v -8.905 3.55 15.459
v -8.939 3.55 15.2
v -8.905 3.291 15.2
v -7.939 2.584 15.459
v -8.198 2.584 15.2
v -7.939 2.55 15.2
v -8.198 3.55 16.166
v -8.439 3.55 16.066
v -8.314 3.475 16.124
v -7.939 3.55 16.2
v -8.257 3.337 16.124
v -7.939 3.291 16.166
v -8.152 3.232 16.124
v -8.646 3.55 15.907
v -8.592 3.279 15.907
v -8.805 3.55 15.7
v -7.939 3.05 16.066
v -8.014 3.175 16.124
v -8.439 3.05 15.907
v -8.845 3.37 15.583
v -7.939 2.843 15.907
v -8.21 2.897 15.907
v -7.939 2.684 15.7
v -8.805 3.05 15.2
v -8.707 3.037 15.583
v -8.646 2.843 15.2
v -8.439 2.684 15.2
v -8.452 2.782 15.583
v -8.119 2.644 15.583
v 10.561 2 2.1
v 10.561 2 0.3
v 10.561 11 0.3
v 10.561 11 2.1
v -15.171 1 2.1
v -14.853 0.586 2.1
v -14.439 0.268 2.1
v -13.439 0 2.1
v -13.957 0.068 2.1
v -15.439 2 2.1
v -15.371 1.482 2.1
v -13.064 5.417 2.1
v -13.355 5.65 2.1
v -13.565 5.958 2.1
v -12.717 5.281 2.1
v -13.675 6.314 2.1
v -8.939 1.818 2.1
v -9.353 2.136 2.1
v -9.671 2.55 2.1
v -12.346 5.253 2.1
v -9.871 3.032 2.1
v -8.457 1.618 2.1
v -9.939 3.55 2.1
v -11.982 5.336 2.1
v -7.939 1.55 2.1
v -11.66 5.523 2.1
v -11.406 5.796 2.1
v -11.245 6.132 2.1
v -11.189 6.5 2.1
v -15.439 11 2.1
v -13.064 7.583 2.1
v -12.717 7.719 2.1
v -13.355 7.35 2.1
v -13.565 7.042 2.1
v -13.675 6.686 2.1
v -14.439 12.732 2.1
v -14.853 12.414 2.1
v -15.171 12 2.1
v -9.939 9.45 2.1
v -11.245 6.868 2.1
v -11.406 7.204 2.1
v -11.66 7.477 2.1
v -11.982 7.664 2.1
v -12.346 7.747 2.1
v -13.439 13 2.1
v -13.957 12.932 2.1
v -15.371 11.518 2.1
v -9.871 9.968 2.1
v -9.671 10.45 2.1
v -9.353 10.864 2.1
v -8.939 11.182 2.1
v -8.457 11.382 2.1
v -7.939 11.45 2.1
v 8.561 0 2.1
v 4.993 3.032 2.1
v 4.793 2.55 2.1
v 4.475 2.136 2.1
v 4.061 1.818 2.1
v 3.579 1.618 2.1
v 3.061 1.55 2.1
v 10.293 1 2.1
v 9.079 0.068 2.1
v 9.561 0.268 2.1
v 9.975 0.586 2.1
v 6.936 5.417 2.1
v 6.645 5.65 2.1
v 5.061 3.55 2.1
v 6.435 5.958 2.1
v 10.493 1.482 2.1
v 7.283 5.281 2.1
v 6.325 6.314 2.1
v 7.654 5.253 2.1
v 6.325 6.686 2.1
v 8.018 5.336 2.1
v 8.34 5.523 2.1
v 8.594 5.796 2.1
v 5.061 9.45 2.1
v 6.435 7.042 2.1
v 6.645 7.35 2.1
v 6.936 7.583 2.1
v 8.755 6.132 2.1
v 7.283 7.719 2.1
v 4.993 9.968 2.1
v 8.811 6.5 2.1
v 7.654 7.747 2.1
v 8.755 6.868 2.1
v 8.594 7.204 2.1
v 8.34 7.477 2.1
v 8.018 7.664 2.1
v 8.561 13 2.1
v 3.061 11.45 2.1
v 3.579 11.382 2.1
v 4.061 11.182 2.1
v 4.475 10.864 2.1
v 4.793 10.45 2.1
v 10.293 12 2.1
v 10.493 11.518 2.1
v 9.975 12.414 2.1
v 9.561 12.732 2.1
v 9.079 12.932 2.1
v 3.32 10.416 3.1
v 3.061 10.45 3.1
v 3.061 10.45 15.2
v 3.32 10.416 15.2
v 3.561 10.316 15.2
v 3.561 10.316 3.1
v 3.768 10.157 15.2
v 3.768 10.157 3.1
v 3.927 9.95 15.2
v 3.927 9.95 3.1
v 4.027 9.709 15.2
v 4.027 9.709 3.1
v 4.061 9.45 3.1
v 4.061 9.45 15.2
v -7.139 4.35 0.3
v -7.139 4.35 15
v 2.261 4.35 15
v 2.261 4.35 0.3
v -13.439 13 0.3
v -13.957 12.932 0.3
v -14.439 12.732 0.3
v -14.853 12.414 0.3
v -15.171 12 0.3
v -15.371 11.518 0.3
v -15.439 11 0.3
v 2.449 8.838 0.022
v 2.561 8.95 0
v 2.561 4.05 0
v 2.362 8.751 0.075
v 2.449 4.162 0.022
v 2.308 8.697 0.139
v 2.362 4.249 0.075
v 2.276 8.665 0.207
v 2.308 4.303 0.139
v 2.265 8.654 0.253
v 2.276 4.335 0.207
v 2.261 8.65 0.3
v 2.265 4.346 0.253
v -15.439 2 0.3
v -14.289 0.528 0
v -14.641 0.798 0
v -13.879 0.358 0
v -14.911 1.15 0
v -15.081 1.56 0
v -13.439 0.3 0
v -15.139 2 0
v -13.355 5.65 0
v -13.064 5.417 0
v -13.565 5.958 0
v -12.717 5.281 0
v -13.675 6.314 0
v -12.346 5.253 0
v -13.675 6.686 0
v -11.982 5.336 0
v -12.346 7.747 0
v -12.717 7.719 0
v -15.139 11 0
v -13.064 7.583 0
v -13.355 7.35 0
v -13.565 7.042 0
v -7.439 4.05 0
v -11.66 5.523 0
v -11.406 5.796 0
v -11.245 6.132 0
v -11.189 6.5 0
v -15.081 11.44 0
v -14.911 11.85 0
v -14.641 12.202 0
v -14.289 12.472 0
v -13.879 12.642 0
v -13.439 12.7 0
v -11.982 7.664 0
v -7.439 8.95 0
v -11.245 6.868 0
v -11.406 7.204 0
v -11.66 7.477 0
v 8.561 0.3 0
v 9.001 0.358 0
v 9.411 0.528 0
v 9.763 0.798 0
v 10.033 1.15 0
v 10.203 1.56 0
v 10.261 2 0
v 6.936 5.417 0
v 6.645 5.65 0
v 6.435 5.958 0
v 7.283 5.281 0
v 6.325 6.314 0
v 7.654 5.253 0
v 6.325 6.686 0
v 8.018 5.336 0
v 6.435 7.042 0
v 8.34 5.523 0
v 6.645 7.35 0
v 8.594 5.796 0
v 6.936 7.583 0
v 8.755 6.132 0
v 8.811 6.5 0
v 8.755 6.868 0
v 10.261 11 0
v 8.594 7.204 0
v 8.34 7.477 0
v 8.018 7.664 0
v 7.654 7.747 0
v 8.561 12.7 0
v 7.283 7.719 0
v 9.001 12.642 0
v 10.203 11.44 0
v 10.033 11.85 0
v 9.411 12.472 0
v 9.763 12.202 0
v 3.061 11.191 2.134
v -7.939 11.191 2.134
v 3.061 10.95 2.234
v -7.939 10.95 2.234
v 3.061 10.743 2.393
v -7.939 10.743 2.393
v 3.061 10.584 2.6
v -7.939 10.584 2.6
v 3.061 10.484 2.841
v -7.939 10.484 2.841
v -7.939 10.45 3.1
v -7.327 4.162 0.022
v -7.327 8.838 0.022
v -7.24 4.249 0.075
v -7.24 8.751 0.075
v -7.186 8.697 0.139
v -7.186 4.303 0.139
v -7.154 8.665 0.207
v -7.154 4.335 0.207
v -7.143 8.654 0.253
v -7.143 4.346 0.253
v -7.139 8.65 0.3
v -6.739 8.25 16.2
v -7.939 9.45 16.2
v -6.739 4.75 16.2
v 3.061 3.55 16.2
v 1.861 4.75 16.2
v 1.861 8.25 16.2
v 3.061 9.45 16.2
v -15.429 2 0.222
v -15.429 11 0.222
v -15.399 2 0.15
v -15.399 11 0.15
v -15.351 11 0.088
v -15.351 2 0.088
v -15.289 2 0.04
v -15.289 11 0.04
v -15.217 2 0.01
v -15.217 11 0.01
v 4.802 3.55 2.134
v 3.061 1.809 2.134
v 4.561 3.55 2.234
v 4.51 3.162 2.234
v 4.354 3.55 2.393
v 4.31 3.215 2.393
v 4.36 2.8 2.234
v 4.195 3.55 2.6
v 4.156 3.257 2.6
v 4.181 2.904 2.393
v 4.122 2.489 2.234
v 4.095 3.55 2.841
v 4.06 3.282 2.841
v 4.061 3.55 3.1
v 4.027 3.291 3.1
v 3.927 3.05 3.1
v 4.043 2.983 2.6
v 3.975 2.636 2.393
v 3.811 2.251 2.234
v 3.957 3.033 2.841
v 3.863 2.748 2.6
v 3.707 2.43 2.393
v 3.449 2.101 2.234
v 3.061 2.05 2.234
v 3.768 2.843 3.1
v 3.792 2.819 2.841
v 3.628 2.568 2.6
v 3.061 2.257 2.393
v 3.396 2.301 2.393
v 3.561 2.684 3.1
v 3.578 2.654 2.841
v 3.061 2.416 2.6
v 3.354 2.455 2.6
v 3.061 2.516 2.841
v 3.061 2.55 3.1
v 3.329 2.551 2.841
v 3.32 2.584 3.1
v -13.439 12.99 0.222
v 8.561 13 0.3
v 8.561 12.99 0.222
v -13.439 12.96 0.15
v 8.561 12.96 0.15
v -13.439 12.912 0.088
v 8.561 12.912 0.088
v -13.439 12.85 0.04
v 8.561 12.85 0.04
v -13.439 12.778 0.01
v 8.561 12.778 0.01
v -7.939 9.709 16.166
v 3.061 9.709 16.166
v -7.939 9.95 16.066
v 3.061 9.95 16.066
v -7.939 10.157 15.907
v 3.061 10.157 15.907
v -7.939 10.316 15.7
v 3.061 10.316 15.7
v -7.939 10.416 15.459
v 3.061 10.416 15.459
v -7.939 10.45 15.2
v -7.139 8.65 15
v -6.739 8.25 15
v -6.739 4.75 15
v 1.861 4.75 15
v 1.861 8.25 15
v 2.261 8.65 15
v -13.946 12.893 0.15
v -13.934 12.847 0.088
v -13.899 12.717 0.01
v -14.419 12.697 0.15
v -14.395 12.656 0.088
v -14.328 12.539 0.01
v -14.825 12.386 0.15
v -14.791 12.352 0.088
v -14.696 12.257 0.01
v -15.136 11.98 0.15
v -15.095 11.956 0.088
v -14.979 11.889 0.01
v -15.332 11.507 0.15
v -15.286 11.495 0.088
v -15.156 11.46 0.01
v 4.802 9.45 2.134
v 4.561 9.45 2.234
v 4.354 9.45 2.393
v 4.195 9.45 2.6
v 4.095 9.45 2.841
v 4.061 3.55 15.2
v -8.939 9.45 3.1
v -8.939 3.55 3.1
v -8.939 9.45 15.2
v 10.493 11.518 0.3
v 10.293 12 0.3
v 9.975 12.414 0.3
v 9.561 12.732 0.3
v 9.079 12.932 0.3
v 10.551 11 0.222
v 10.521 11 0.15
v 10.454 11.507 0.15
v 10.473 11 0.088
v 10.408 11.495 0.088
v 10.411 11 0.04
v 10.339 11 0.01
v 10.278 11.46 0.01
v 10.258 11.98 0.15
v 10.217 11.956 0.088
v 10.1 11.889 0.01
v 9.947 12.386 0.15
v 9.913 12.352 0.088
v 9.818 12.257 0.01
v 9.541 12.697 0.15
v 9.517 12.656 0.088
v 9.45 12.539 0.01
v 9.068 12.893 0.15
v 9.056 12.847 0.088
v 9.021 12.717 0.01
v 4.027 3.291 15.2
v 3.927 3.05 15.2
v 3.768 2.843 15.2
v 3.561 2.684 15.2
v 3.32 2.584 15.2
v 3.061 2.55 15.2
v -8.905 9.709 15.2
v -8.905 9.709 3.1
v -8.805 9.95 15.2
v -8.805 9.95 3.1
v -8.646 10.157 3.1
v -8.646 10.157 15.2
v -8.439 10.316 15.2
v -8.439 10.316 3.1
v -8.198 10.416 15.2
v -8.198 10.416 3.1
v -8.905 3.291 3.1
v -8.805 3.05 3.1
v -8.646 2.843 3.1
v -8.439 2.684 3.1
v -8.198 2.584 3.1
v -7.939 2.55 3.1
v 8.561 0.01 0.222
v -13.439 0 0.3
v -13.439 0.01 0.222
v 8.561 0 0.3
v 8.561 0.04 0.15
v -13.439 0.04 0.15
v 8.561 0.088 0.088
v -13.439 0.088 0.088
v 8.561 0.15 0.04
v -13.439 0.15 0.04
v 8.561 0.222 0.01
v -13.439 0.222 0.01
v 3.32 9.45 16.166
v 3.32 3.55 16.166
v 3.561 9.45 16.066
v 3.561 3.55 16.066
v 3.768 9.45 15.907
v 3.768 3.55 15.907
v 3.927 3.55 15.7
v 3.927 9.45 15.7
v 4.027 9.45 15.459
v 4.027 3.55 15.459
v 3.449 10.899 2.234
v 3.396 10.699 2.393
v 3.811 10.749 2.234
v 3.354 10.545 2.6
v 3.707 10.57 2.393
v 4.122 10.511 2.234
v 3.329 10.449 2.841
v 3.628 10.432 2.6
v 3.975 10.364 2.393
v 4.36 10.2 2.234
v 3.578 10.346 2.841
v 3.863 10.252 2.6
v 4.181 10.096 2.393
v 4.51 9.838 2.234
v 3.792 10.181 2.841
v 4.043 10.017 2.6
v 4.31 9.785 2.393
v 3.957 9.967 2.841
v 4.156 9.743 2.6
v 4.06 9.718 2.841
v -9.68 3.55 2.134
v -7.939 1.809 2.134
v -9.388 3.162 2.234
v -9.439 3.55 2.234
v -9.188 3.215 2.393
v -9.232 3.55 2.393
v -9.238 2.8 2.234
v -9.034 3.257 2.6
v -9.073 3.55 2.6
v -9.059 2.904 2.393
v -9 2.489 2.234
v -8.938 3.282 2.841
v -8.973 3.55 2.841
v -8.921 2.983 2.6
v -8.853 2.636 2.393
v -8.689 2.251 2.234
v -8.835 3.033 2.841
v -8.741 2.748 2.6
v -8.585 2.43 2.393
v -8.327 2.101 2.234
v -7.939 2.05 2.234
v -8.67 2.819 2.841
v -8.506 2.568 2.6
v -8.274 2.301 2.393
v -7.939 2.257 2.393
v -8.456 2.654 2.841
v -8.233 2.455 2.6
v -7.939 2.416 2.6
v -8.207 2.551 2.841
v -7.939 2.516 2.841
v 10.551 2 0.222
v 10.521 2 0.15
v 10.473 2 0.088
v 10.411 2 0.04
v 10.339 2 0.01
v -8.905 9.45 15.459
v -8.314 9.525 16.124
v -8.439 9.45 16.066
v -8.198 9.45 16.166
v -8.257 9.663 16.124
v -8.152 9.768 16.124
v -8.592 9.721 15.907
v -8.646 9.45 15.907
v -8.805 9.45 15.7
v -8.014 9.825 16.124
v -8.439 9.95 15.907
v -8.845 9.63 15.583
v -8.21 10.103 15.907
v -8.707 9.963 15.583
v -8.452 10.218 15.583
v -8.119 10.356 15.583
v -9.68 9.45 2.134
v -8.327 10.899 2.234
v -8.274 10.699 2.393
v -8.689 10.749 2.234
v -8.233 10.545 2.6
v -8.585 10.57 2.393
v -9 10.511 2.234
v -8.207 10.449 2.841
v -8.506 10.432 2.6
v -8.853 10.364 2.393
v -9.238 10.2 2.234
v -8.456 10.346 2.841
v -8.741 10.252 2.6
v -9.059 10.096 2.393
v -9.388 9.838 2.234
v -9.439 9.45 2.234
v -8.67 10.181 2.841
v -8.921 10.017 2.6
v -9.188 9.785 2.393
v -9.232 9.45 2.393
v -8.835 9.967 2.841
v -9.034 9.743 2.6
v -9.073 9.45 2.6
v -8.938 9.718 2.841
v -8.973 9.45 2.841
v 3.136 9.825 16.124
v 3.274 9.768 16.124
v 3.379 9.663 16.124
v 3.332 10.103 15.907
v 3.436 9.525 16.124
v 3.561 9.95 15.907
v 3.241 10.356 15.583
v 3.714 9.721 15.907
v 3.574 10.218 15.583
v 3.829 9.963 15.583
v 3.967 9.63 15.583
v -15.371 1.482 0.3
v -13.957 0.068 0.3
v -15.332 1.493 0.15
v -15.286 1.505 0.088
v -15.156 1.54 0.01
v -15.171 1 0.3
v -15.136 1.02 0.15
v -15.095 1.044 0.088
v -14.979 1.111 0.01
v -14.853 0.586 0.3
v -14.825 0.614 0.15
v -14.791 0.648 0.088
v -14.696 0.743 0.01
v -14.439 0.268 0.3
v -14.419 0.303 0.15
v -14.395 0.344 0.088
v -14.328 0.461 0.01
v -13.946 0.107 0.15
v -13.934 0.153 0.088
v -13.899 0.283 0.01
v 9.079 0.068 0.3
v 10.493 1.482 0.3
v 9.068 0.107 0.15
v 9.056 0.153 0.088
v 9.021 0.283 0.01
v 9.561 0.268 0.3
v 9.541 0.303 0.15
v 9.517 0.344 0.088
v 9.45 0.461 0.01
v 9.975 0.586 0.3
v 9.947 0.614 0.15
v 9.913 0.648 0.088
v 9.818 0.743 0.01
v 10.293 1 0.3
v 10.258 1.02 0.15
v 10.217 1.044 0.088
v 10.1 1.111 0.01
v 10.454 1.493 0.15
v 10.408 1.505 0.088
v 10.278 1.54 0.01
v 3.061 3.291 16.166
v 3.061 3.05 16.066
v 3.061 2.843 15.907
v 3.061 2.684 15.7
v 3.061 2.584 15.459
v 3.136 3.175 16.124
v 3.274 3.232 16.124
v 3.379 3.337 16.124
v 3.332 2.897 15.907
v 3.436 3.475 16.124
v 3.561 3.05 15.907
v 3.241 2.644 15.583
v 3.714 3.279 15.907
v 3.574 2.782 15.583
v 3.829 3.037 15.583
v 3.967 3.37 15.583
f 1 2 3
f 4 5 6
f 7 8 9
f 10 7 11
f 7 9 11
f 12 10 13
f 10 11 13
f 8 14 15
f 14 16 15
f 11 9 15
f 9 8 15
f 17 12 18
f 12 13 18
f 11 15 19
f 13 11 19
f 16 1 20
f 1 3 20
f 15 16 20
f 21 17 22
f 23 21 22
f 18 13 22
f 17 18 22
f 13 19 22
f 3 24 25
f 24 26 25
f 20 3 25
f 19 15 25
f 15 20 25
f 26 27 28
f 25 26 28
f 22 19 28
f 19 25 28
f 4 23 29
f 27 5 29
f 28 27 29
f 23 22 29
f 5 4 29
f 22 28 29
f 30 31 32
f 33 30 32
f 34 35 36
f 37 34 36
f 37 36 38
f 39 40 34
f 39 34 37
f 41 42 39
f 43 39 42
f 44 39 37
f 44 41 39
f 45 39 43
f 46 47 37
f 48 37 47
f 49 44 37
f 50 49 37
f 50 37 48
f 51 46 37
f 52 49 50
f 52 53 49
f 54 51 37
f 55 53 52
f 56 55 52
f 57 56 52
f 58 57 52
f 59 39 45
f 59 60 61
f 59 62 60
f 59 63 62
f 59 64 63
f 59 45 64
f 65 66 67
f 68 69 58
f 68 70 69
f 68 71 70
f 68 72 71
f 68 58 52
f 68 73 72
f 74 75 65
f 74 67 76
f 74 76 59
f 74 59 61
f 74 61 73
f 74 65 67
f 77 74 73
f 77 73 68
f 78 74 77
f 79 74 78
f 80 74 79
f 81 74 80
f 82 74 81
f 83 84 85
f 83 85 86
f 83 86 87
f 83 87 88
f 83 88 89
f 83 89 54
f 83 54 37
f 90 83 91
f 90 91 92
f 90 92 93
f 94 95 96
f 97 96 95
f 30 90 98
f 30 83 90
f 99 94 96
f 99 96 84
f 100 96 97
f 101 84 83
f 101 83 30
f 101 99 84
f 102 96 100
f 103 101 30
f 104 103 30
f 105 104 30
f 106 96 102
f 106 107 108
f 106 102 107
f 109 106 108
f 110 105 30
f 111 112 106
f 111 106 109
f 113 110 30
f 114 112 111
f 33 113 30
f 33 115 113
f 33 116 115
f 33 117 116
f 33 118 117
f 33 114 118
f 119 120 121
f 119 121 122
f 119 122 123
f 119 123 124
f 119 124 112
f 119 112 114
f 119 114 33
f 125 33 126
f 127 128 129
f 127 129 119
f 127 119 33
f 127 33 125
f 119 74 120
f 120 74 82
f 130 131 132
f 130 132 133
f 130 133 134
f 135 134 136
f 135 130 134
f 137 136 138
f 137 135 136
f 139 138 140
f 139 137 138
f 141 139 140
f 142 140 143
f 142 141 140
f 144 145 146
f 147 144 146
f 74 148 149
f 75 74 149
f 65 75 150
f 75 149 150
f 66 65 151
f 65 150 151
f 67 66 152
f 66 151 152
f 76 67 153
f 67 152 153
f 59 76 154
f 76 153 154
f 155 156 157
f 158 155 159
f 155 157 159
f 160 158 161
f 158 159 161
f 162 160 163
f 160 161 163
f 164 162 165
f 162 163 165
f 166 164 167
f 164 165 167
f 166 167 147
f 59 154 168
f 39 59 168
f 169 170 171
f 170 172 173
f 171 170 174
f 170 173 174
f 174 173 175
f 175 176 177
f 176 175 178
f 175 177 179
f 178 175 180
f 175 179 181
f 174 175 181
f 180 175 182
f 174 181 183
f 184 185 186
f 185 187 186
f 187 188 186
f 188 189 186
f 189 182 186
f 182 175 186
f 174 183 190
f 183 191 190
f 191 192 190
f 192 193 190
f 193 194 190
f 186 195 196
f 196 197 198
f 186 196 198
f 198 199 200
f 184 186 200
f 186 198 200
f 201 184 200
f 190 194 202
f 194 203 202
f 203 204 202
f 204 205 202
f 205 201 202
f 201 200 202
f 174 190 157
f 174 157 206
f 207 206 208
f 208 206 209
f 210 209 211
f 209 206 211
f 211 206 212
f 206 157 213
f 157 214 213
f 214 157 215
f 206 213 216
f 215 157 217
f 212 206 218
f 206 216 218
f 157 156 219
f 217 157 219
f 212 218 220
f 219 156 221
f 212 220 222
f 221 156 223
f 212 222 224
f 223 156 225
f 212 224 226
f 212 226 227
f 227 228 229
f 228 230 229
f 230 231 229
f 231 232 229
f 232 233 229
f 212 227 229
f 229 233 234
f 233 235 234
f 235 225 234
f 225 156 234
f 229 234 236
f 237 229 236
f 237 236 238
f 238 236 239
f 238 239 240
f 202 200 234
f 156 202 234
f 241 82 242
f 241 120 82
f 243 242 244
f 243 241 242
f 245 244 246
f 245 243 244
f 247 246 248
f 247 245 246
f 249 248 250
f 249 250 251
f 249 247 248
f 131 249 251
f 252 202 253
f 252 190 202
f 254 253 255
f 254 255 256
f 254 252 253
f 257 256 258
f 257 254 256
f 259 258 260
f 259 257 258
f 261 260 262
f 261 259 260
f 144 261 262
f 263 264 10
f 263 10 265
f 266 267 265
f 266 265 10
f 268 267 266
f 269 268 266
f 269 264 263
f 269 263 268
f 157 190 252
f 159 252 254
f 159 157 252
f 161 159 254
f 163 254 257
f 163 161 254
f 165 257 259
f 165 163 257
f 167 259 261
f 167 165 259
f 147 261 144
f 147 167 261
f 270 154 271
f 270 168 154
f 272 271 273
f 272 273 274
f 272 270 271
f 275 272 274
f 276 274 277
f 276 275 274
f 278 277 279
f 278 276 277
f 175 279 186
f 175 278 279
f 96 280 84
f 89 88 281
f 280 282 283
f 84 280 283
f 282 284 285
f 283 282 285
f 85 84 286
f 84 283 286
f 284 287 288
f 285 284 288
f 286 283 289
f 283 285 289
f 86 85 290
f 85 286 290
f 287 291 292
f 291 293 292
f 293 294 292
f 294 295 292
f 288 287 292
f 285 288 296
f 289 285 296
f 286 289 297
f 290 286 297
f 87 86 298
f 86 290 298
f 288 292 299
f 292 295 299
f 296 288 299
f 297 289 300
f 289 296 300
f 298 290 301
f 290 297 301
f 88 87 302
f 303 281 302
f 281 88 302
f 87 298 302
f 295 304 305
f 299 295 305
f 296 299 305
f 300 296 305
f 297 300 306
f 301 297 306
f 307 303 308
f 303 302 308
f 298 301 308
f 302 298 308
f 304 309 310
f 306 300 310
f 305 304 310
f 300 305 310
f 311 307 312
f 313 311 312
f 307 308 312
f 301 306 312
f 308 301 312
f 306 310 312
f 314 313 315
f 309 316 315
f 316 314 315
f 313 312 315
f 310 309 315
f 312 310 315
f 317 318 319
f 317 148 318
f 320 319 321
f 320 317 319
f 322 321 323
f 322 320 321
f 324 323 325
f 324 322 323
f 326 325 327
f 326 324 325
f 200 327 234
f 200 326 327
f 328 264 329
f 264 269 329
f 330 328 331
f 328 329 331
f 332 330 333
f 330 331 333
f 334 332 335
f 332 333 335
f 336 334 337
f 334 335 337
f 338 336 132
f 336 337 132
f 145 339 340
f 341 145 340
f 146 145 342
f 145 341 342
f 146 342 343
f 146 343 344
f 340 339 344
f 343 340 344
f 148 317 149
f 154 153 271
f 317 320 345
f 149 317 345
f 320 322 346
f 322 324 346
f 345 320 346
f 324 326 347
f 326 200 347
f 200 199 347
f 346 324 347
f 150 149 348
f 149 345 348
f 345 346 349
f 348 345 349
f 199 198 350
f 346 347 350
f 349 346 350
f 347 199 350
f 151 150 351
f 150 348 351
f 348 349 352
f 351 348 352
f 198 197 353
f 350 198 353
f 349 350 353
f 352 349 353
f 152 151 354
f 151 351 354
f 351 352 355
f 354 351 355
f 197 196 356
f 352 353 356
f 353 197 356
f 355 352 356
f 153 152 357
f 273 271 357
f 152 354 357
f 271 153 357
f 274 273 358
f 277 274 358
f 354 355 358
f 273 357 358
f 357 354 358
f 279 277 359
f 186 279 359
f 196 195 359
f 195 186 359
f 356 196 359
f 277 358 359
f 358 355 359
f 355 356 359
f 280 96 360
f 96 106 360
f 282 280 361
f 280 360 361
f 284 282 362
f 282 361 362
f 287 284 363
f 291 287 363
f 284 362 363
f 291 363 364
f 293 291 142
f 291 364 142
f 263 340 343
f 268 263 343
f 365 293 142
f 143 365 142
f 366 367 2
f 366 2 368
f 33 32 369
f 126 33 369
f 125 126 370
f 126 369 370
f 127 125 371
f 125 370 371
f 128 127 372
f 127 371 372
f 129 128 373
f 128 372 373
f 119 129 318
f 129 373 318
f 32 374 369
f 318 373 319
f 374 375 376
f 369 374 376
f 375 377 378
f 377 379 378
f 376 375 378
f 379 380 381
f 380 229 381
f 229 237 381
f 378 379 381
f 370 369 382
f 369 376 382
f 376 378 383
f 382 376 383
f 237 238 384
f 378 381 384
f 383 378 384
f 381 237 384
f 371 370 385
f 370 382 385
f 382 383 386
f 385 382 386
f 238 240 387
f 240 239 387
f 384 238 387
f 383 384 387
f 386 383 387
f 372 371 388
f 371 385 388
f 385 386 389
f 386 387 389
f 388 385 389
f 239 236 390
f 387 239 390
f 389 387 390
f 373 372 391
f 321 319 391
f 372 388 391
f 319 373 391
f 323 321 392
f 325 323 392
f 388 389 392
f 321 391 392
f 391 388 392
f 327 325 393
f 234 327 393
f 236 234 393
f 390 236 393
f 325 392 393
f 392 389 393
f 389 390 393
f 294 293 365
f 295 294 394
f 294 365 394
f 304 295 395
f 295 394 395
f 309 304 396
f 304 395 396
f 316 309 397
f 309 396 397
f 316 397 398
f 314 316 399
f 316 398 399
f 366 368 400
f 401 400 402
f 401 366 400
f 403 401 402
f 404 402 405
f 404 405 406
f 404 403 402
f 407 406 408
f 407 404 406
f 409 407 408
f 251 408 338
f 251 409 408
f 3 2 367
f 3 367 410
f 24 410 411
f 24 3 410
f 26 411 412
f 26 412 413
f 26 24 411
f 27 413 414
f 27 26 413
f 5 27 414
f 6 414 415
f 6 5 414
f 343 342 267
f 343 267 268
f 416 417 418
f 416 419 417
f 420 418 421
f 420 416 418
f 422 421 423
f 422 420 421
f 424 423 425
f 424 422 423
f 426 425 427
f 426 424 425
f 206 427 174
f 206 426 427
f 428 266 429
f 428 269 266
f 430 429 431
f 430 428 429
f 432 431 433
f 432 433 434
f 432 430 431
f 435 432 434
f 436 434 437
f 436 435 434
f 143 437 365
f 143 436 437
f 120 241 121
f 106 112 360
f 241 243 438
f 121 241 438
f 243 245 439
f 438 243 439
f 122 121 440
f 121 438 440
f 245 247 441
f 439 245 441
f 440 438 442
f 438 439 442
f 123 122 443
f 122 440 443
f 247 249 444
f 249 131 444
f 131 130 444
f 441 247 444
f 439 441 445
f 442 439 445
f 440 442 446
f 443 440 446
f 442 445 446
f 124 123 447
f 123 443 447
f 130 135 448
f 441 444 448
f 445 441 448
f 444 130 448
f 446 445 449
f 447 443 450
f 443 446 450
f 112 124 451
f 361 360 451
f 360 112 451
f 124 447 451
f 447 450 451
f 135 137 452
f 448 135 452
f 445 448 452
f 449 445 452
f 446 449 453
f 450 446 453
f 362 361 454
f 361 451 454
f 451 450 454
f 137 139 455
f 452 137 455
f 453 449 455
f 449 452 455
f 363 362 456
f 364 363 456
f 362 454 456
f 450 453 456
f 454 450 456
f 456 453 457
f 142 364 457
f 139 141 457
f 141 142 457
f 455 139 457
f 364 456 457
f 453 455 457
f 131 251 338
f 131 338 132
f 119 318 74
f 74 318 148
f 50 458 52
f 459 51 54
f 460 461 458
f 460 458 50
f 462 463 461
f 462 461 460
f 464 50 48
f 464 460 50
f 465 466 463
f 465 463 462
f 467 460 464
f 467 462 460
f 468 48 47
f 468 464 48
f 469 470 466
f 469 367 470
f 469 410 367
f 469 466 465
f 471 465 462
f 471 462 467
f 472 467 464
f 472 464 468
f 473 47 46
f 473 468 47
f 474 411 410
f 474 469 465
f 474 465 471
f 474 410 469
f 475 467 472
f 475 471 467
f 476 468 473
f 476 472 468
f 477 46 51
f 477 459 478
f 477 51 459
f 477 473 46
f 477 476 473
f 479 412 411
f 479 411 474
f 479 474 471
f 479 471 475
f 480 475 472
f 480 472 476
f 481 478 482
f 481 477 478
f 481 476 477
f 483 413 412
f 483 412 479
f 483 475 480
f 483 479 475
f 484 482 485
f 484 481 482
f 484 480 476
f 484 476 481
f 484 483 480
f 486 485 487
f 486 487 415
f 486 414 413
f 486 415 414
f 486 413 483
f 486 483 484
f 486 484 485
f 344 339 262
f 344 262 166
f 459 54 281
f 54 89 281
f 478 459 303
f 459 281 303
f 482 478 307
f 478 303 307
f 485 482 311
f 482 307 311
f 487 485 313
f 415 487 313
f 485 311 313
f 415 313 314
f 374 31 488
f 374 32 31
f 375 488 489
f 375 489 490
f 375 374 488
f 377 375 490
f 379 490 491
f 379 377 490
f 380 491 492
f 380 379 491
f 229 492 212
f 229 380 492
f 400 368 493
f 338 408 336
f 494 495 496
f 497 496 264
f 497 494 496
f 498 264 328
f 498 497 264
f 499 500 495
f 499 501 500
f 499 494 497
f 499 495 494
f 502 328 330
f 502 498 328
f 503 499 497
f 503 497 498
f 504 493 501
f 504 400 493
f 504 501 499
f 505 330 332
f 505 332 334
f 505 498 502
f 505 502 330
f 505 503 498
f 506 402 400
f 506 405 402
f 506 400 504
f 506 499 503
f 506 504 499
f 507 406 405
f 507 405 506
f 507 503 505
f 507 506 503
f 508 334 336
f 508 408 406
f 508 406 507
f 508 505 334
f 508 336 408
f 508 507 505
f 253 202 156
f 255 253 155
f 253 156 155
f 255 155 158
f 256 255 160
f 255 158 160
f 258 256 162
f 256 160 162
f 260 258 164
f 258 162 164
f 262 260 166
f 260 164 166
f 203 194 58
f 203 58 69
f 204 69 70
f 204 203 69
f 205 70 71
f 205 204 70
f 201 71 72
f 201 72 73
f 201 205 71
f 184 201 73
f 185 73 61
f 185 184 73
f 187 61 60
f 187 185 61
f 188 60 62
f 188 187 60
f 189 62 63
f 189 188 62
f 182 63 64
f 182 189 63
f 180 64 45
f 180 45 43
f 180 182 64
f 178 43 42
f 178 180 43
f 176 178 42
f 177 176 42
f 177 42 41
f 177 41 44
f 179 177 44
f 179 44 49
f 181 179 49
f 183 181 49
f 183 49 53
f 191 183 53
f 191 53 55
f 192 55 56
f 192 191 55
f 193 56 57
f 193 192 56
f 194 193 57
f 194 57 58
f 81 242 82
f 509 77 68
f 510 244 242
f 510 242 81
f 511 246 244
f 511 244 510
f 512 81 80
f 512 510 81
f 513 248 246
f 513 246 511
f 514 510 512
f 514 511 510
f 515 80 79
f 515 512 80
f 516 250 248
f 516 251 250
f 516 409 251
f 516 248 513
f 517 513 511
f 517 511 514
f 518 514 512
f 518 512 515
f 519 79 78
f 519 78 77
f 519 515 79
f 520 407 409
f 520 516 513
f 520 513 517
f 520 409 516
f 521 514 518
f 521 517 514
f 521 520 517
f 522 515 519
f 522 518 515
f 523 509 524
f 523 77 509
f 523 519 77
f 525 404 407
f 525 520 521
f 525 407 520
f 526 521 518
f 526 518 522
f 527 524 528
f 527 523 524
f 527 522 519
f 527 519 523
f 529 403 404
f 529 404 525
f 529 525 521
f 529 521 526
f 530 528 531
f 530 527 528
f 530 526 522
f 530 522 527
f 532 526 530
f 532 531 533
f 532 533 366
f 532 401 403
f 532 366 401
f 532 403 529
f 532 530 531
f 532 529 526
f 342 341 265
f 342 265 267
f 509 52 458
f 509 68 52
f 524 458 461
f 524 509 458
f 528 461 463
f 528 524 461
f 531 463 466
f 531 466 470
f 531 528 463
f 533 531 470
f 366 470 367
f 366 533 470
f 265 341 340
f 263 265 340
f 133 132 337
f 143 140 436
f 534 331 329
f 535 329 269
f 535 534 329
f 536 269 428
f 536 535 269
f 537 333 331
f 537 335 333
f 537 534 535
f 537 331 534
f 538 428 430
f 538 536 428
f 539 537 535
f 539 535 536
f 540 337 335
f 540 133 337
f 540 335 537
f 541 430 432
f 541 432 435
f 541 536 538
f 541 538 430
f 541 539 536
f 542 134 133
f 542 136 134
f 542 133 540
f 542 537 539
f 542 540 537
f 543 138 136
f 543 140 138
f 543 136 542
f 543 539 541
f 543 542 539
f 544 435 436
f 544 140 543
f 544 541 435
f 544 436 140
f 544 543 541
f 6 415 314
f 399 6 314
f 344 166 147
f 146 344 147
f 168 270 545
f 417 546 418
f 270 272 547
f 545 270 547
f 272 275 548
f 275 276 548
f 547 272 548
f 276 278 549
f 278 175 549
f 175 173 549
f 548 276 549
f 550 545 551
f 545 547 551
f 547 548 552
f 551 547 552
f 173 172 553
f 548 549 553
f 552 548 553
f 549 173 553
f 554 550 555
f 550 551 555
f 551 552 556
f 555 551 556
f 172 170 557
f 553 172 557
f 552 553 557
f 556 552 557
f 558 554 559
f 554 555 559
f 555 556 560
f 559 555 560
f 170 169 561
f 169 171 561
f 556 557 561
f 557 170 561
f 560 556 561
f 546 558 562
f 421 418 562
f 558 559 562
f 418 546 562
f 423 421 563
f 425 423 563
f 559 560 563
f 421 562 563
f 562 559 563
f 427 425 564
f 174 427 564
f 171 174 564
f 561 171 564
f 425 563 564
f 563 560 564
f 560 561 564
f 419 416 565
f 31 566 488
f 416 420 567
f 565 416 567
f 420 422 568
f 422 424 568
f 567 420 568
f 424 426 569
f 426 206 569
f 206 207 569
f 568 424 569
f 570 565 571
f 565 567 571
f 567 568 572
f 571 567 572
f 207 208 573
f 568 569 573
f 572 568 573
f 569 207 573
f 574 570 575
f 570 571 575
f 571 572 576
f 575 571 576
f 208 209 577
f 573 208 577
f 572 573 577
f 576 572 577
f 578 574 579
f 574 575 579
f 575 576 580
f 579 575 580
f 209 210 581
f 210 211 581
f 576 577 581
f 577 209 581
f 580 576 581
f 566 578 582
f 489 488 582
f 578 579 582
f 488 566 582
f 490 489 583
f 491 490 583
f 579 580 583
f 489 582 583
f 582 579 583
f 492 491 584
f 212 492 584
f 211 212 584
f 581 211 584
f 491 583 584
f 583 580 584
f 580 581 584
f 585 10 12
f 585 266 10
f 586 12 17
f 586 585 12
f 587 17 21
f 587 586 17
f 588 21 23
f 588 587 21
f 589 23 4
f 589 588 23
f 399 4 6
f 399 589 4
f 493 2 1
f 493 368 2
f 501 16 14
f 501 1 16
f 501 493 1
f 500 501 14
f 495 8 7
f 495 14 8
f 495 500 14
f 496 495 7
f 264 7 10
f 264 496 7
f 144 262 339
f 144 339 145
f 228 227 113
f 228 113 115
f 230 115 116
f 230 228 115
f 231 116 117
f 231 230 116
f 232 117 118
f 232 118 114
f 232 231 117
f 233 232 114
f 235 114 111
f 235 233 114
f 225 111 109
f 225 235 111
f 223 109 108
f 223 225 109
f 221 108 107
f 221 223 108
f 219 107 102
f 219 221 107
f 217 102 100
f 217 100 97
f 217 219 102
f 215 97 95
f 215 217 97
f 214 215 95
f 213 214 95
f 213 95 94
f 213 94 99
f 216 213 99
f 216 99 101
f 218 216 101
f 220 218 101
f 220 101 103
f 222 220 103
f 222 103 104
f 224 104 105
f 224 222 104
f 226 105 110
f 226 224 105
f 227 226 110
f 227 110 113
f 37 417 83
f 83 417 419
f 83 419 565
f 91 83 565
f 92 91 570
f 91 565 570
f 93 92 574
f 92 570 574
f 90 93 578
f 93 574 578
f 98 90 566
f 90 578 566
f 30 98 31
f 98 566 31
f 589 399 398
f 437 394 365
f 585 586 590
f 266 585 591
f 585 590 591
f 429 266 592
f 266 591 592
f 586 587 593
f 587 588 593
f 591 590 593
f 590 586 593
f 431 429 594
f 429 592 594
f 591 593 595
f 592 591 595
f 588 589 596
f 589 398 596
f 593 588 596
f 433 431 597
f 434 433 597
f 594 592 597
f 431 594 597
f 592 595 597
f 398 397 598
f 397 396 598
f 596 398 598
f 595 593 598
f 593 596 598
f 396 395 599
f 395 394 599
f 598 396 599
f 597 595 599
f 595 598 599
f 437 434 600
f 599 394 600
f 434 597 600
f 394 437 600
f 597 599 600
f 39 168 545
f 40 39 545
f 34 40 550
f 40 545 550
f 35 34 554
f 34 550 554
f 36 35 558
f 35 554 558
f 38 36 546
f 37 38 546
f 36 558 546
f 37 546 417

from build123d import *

# Parameters (mm, degrees)
F0_R     = 1.25
F1_DEPTH = 2.1
F2_W     = 9.4
F2_H     = 4.3
F3_DEPTH = 15
F4_W     = 13
F4_H     = 7.9
F5_DEPTH = 12.9
F6_W     = 13
F6_H     = 7.9
F7_DEPTH = 1.2
F8_W     = 8.6
F8_H     = 3.5
F9_DEPTH = 25
F13_R    = 1
F14_R    = 0.3


with BuildPart() as f1:
    # F0 (on Top) → F1 (new body)
    with BuildSketch(Plane.XY):
        with BuildLine():
            Line((8.560975, 13), (-13.439025, 13))
            ThreePointArc((-13.439025, 13), (-14.853238, 12.414214), (-15.439025, 11))
            Line((-15.439025, 11), (-15.439025, 2))
            ThreePointArc((-15.439025, 2), (-14.853238, 0.585786), (-13.439025, 0))
            Line((-13.439025, 0), (8.560975, 0))
            ThreePointArc((8.560975, 0), (9.975189, 0.585786), (10.560975, 2))
            Line((10.560975, 2), (10.560975, 11))
            ThreePointArc((10.560975, 11), (9.975189, 12.414214), (8.560975, 13))
        make_face()
        with Locations((-12.439025, 6.5)):
            Circle(F0_R, mode=Mode.SUBTRACT)
        with Locations((7.560975, 6.5)):
            Circle(F0_R, mode=Mode.SUBTRACT)
    extrude(amount=F1_DEPTH)


with BuildPart() as f3:
    # F2 (on face) → F3 (new body)
    with BuildSketch(Plane(origin=(0, 0, 0), x_dir=(1, 0, 0), z_dir=(0, 0, -1))):
        with Locations((-2.439025, -6.5)):
            Rectangle(F2_W, F2_H)
    extrude(amount=-F3_DEPTH)


with BuildPart() as f5:
    # F4 (on face) → F5 (new body, through all)
    with BuildSketch(Plane.XY.offset(2.1)):
        with Locations((-2.439025, 6.5)):
            Rectangle(F4_W, F4_H)
    extrude(amount=F5_DEPTH)

    # F11: cut F3
    add(f3.part, mode=Mode.SUBTRACT)


with BuildPart() as f7:
    # F6 (on face) → F7 (new body)
    with BuildSketch(Plane.XY.offset(15)):
        with Locations((-2.439025, 6.5)):
            Rectangle(F6_W, F6_H)
    extrude(amount=F7_DEPTH)


with BuildPart() as f9:
    # F8 (on face) → F9 (new body)
    with BuildSketch(Plane.XY.offset(15)):
        with Locations((-2.439025, 6.5)):
            Rectangle(F8_W, F8_H)
    extrude(amount=F9_DEPTH)


with BuildPart() as f7_1:
    add(f7.part)

    # F10: cut F9
    add(f9.part, mode=Mode.SUBTRACT)


with BuildPart() as f1_1:
    add(f1.part)

    # F11: cut F3
    add(f3.part, mode=Mode.SUBTRACT)


with BuildPart() as f7_2:
    add(f7_1.part)

    # F12: union F5, F1
    add(f5.part)
    add(f1_1.part)

    # F13
    f13_edges = [f7_2.edges().sort_by_distance(p)[0] for p in [
        (-2.439025, 10.45, 2.1),
        (4.060975, 6.5, 2.1),
        (-8.939025, 6.5, 2.1),
        (-2.439025, 2.55, 2.1),
        (-8.939025, 10.45, 9.15),
        (-8.939025, 2.55, 9.15),
        (4.060975, 10.45, 9.15),
        (4.060975, 2.55, 9.15),
        (-8.939025, 6.5, 16.2),
        (-2.439025, 10.45, 16.2),
        (-2.439025, 2.55, 16.2),
        (4.060975, 6.5, 16.2),
    ]]
    fillet(f13_edges, radius=F13_R)

    # F14
    f14_edges = [f7_2.edges().sort_by_distance(p)[0] for p in [
        (2.260975, 6.5, 0),
        (-2.439025, 8.65, 0),
        (-7.139025, 6.5, 0),
        (-2.439025, 4.35, 0),
        (-2.439025, 13, 0),
    ]]
    fillet(f14_edges, radius=F14_R)


solid = f7_2.part
